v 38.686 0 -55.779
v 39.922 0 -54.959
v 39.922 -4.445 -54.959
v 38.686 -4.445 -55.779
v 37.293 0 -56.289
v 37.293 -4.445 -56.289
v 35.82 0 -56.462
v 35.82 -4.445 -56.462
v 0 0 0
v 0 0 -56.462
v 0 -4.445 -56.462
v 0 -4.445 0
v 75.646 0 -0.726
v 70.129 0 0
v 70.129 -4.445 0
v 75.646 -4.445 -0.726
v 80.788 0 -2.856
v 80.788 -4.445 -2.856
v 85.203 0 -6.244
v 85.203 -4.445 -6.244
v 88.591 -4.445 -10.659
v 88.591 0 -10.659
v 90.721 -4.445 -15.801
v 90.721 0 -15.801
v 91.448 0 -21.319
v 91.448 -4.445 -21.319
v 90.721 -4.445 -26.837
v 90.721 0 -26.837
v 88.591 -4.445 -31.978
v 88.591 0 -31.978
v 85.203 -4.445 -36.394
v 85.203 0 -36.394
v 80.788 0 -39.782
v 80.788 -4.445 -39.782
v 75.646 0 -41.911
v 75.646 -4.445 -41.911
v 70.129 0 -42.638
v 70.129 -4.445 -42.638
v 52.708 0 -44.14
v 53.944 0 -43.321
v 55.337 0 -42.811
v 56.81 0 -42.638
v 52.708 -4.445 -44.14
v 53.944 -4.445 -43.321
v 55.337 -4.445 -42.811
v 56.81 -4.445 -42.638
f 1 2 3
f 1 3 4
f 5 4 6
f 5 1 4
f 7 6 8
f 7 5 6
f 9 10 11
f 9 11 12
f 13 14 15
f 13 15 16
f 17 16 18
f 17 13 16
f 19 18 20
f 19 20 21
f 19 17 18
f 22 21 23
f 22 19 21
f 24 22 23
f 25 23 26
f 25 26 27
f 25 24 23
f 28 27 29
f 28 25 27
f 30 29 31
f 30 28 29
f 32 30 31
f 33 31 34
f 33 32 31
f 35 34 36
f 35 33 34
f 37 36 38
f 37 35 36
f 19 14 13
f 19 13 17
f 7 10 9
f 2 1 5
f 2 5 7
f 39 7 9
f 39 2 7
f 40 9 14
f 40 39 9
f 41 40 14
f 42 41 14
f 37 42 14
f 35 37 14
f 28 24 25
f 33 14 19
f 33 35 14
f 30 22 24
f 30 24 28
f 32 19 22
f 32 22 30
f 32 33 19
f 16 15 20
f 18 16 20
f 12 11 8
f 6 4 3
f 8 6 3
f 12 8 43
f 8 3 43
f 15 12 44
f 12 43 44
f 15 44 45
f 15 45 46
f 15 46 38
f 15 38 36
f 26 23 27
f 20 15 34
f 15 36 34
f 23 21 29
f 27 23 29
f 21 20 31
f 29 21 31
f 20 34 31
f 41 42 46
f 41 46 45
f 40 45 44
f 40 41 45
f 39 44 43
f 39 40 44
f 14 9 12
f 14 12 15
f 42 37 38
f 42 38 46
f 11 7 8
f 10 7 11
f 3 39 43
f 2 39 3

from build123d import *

# Parameters (mm, degrees)
EXTRUDE2_DEPTH = 4.445


with BuildPart() as part:
    # Sketch1 → Extrude2 (new body)
    with BuildSketch(Plane(origin=(0, 0, 0), x_dir=(1, 0, 0), z_dir=(0, 1, 0))):
        with BuildLine():
            Line((0, 0), (70.128669853, 0))
            ThreePointArc((70.128669853, 0), (91.447571558, 21.318901704), (70.128669853, 42.637803409))
            Line((70.128669853, 42.637803409), (56.809824029, 42.637803409))
            ThreePointArc((56.809824029, 42.637803409), (54.625693022, 43.025247602), (52.708090795, 44.140300497))
            Line((52.708090795, 44.140300497), (39.921942966, 54.95934866))
            ThreePointArc((39.921942966, 54.95934866), (38.004340739, 56.074401554), (35.820209733, 56.461845748))
            Line((35.820209733, 56.461845748), (0, 56.461845748))
            Line((0, 56.461845748), (0, 0))
        make_face()
    extrude(amount=-EXTRUDE2_DEPTH)


solid = part.part
